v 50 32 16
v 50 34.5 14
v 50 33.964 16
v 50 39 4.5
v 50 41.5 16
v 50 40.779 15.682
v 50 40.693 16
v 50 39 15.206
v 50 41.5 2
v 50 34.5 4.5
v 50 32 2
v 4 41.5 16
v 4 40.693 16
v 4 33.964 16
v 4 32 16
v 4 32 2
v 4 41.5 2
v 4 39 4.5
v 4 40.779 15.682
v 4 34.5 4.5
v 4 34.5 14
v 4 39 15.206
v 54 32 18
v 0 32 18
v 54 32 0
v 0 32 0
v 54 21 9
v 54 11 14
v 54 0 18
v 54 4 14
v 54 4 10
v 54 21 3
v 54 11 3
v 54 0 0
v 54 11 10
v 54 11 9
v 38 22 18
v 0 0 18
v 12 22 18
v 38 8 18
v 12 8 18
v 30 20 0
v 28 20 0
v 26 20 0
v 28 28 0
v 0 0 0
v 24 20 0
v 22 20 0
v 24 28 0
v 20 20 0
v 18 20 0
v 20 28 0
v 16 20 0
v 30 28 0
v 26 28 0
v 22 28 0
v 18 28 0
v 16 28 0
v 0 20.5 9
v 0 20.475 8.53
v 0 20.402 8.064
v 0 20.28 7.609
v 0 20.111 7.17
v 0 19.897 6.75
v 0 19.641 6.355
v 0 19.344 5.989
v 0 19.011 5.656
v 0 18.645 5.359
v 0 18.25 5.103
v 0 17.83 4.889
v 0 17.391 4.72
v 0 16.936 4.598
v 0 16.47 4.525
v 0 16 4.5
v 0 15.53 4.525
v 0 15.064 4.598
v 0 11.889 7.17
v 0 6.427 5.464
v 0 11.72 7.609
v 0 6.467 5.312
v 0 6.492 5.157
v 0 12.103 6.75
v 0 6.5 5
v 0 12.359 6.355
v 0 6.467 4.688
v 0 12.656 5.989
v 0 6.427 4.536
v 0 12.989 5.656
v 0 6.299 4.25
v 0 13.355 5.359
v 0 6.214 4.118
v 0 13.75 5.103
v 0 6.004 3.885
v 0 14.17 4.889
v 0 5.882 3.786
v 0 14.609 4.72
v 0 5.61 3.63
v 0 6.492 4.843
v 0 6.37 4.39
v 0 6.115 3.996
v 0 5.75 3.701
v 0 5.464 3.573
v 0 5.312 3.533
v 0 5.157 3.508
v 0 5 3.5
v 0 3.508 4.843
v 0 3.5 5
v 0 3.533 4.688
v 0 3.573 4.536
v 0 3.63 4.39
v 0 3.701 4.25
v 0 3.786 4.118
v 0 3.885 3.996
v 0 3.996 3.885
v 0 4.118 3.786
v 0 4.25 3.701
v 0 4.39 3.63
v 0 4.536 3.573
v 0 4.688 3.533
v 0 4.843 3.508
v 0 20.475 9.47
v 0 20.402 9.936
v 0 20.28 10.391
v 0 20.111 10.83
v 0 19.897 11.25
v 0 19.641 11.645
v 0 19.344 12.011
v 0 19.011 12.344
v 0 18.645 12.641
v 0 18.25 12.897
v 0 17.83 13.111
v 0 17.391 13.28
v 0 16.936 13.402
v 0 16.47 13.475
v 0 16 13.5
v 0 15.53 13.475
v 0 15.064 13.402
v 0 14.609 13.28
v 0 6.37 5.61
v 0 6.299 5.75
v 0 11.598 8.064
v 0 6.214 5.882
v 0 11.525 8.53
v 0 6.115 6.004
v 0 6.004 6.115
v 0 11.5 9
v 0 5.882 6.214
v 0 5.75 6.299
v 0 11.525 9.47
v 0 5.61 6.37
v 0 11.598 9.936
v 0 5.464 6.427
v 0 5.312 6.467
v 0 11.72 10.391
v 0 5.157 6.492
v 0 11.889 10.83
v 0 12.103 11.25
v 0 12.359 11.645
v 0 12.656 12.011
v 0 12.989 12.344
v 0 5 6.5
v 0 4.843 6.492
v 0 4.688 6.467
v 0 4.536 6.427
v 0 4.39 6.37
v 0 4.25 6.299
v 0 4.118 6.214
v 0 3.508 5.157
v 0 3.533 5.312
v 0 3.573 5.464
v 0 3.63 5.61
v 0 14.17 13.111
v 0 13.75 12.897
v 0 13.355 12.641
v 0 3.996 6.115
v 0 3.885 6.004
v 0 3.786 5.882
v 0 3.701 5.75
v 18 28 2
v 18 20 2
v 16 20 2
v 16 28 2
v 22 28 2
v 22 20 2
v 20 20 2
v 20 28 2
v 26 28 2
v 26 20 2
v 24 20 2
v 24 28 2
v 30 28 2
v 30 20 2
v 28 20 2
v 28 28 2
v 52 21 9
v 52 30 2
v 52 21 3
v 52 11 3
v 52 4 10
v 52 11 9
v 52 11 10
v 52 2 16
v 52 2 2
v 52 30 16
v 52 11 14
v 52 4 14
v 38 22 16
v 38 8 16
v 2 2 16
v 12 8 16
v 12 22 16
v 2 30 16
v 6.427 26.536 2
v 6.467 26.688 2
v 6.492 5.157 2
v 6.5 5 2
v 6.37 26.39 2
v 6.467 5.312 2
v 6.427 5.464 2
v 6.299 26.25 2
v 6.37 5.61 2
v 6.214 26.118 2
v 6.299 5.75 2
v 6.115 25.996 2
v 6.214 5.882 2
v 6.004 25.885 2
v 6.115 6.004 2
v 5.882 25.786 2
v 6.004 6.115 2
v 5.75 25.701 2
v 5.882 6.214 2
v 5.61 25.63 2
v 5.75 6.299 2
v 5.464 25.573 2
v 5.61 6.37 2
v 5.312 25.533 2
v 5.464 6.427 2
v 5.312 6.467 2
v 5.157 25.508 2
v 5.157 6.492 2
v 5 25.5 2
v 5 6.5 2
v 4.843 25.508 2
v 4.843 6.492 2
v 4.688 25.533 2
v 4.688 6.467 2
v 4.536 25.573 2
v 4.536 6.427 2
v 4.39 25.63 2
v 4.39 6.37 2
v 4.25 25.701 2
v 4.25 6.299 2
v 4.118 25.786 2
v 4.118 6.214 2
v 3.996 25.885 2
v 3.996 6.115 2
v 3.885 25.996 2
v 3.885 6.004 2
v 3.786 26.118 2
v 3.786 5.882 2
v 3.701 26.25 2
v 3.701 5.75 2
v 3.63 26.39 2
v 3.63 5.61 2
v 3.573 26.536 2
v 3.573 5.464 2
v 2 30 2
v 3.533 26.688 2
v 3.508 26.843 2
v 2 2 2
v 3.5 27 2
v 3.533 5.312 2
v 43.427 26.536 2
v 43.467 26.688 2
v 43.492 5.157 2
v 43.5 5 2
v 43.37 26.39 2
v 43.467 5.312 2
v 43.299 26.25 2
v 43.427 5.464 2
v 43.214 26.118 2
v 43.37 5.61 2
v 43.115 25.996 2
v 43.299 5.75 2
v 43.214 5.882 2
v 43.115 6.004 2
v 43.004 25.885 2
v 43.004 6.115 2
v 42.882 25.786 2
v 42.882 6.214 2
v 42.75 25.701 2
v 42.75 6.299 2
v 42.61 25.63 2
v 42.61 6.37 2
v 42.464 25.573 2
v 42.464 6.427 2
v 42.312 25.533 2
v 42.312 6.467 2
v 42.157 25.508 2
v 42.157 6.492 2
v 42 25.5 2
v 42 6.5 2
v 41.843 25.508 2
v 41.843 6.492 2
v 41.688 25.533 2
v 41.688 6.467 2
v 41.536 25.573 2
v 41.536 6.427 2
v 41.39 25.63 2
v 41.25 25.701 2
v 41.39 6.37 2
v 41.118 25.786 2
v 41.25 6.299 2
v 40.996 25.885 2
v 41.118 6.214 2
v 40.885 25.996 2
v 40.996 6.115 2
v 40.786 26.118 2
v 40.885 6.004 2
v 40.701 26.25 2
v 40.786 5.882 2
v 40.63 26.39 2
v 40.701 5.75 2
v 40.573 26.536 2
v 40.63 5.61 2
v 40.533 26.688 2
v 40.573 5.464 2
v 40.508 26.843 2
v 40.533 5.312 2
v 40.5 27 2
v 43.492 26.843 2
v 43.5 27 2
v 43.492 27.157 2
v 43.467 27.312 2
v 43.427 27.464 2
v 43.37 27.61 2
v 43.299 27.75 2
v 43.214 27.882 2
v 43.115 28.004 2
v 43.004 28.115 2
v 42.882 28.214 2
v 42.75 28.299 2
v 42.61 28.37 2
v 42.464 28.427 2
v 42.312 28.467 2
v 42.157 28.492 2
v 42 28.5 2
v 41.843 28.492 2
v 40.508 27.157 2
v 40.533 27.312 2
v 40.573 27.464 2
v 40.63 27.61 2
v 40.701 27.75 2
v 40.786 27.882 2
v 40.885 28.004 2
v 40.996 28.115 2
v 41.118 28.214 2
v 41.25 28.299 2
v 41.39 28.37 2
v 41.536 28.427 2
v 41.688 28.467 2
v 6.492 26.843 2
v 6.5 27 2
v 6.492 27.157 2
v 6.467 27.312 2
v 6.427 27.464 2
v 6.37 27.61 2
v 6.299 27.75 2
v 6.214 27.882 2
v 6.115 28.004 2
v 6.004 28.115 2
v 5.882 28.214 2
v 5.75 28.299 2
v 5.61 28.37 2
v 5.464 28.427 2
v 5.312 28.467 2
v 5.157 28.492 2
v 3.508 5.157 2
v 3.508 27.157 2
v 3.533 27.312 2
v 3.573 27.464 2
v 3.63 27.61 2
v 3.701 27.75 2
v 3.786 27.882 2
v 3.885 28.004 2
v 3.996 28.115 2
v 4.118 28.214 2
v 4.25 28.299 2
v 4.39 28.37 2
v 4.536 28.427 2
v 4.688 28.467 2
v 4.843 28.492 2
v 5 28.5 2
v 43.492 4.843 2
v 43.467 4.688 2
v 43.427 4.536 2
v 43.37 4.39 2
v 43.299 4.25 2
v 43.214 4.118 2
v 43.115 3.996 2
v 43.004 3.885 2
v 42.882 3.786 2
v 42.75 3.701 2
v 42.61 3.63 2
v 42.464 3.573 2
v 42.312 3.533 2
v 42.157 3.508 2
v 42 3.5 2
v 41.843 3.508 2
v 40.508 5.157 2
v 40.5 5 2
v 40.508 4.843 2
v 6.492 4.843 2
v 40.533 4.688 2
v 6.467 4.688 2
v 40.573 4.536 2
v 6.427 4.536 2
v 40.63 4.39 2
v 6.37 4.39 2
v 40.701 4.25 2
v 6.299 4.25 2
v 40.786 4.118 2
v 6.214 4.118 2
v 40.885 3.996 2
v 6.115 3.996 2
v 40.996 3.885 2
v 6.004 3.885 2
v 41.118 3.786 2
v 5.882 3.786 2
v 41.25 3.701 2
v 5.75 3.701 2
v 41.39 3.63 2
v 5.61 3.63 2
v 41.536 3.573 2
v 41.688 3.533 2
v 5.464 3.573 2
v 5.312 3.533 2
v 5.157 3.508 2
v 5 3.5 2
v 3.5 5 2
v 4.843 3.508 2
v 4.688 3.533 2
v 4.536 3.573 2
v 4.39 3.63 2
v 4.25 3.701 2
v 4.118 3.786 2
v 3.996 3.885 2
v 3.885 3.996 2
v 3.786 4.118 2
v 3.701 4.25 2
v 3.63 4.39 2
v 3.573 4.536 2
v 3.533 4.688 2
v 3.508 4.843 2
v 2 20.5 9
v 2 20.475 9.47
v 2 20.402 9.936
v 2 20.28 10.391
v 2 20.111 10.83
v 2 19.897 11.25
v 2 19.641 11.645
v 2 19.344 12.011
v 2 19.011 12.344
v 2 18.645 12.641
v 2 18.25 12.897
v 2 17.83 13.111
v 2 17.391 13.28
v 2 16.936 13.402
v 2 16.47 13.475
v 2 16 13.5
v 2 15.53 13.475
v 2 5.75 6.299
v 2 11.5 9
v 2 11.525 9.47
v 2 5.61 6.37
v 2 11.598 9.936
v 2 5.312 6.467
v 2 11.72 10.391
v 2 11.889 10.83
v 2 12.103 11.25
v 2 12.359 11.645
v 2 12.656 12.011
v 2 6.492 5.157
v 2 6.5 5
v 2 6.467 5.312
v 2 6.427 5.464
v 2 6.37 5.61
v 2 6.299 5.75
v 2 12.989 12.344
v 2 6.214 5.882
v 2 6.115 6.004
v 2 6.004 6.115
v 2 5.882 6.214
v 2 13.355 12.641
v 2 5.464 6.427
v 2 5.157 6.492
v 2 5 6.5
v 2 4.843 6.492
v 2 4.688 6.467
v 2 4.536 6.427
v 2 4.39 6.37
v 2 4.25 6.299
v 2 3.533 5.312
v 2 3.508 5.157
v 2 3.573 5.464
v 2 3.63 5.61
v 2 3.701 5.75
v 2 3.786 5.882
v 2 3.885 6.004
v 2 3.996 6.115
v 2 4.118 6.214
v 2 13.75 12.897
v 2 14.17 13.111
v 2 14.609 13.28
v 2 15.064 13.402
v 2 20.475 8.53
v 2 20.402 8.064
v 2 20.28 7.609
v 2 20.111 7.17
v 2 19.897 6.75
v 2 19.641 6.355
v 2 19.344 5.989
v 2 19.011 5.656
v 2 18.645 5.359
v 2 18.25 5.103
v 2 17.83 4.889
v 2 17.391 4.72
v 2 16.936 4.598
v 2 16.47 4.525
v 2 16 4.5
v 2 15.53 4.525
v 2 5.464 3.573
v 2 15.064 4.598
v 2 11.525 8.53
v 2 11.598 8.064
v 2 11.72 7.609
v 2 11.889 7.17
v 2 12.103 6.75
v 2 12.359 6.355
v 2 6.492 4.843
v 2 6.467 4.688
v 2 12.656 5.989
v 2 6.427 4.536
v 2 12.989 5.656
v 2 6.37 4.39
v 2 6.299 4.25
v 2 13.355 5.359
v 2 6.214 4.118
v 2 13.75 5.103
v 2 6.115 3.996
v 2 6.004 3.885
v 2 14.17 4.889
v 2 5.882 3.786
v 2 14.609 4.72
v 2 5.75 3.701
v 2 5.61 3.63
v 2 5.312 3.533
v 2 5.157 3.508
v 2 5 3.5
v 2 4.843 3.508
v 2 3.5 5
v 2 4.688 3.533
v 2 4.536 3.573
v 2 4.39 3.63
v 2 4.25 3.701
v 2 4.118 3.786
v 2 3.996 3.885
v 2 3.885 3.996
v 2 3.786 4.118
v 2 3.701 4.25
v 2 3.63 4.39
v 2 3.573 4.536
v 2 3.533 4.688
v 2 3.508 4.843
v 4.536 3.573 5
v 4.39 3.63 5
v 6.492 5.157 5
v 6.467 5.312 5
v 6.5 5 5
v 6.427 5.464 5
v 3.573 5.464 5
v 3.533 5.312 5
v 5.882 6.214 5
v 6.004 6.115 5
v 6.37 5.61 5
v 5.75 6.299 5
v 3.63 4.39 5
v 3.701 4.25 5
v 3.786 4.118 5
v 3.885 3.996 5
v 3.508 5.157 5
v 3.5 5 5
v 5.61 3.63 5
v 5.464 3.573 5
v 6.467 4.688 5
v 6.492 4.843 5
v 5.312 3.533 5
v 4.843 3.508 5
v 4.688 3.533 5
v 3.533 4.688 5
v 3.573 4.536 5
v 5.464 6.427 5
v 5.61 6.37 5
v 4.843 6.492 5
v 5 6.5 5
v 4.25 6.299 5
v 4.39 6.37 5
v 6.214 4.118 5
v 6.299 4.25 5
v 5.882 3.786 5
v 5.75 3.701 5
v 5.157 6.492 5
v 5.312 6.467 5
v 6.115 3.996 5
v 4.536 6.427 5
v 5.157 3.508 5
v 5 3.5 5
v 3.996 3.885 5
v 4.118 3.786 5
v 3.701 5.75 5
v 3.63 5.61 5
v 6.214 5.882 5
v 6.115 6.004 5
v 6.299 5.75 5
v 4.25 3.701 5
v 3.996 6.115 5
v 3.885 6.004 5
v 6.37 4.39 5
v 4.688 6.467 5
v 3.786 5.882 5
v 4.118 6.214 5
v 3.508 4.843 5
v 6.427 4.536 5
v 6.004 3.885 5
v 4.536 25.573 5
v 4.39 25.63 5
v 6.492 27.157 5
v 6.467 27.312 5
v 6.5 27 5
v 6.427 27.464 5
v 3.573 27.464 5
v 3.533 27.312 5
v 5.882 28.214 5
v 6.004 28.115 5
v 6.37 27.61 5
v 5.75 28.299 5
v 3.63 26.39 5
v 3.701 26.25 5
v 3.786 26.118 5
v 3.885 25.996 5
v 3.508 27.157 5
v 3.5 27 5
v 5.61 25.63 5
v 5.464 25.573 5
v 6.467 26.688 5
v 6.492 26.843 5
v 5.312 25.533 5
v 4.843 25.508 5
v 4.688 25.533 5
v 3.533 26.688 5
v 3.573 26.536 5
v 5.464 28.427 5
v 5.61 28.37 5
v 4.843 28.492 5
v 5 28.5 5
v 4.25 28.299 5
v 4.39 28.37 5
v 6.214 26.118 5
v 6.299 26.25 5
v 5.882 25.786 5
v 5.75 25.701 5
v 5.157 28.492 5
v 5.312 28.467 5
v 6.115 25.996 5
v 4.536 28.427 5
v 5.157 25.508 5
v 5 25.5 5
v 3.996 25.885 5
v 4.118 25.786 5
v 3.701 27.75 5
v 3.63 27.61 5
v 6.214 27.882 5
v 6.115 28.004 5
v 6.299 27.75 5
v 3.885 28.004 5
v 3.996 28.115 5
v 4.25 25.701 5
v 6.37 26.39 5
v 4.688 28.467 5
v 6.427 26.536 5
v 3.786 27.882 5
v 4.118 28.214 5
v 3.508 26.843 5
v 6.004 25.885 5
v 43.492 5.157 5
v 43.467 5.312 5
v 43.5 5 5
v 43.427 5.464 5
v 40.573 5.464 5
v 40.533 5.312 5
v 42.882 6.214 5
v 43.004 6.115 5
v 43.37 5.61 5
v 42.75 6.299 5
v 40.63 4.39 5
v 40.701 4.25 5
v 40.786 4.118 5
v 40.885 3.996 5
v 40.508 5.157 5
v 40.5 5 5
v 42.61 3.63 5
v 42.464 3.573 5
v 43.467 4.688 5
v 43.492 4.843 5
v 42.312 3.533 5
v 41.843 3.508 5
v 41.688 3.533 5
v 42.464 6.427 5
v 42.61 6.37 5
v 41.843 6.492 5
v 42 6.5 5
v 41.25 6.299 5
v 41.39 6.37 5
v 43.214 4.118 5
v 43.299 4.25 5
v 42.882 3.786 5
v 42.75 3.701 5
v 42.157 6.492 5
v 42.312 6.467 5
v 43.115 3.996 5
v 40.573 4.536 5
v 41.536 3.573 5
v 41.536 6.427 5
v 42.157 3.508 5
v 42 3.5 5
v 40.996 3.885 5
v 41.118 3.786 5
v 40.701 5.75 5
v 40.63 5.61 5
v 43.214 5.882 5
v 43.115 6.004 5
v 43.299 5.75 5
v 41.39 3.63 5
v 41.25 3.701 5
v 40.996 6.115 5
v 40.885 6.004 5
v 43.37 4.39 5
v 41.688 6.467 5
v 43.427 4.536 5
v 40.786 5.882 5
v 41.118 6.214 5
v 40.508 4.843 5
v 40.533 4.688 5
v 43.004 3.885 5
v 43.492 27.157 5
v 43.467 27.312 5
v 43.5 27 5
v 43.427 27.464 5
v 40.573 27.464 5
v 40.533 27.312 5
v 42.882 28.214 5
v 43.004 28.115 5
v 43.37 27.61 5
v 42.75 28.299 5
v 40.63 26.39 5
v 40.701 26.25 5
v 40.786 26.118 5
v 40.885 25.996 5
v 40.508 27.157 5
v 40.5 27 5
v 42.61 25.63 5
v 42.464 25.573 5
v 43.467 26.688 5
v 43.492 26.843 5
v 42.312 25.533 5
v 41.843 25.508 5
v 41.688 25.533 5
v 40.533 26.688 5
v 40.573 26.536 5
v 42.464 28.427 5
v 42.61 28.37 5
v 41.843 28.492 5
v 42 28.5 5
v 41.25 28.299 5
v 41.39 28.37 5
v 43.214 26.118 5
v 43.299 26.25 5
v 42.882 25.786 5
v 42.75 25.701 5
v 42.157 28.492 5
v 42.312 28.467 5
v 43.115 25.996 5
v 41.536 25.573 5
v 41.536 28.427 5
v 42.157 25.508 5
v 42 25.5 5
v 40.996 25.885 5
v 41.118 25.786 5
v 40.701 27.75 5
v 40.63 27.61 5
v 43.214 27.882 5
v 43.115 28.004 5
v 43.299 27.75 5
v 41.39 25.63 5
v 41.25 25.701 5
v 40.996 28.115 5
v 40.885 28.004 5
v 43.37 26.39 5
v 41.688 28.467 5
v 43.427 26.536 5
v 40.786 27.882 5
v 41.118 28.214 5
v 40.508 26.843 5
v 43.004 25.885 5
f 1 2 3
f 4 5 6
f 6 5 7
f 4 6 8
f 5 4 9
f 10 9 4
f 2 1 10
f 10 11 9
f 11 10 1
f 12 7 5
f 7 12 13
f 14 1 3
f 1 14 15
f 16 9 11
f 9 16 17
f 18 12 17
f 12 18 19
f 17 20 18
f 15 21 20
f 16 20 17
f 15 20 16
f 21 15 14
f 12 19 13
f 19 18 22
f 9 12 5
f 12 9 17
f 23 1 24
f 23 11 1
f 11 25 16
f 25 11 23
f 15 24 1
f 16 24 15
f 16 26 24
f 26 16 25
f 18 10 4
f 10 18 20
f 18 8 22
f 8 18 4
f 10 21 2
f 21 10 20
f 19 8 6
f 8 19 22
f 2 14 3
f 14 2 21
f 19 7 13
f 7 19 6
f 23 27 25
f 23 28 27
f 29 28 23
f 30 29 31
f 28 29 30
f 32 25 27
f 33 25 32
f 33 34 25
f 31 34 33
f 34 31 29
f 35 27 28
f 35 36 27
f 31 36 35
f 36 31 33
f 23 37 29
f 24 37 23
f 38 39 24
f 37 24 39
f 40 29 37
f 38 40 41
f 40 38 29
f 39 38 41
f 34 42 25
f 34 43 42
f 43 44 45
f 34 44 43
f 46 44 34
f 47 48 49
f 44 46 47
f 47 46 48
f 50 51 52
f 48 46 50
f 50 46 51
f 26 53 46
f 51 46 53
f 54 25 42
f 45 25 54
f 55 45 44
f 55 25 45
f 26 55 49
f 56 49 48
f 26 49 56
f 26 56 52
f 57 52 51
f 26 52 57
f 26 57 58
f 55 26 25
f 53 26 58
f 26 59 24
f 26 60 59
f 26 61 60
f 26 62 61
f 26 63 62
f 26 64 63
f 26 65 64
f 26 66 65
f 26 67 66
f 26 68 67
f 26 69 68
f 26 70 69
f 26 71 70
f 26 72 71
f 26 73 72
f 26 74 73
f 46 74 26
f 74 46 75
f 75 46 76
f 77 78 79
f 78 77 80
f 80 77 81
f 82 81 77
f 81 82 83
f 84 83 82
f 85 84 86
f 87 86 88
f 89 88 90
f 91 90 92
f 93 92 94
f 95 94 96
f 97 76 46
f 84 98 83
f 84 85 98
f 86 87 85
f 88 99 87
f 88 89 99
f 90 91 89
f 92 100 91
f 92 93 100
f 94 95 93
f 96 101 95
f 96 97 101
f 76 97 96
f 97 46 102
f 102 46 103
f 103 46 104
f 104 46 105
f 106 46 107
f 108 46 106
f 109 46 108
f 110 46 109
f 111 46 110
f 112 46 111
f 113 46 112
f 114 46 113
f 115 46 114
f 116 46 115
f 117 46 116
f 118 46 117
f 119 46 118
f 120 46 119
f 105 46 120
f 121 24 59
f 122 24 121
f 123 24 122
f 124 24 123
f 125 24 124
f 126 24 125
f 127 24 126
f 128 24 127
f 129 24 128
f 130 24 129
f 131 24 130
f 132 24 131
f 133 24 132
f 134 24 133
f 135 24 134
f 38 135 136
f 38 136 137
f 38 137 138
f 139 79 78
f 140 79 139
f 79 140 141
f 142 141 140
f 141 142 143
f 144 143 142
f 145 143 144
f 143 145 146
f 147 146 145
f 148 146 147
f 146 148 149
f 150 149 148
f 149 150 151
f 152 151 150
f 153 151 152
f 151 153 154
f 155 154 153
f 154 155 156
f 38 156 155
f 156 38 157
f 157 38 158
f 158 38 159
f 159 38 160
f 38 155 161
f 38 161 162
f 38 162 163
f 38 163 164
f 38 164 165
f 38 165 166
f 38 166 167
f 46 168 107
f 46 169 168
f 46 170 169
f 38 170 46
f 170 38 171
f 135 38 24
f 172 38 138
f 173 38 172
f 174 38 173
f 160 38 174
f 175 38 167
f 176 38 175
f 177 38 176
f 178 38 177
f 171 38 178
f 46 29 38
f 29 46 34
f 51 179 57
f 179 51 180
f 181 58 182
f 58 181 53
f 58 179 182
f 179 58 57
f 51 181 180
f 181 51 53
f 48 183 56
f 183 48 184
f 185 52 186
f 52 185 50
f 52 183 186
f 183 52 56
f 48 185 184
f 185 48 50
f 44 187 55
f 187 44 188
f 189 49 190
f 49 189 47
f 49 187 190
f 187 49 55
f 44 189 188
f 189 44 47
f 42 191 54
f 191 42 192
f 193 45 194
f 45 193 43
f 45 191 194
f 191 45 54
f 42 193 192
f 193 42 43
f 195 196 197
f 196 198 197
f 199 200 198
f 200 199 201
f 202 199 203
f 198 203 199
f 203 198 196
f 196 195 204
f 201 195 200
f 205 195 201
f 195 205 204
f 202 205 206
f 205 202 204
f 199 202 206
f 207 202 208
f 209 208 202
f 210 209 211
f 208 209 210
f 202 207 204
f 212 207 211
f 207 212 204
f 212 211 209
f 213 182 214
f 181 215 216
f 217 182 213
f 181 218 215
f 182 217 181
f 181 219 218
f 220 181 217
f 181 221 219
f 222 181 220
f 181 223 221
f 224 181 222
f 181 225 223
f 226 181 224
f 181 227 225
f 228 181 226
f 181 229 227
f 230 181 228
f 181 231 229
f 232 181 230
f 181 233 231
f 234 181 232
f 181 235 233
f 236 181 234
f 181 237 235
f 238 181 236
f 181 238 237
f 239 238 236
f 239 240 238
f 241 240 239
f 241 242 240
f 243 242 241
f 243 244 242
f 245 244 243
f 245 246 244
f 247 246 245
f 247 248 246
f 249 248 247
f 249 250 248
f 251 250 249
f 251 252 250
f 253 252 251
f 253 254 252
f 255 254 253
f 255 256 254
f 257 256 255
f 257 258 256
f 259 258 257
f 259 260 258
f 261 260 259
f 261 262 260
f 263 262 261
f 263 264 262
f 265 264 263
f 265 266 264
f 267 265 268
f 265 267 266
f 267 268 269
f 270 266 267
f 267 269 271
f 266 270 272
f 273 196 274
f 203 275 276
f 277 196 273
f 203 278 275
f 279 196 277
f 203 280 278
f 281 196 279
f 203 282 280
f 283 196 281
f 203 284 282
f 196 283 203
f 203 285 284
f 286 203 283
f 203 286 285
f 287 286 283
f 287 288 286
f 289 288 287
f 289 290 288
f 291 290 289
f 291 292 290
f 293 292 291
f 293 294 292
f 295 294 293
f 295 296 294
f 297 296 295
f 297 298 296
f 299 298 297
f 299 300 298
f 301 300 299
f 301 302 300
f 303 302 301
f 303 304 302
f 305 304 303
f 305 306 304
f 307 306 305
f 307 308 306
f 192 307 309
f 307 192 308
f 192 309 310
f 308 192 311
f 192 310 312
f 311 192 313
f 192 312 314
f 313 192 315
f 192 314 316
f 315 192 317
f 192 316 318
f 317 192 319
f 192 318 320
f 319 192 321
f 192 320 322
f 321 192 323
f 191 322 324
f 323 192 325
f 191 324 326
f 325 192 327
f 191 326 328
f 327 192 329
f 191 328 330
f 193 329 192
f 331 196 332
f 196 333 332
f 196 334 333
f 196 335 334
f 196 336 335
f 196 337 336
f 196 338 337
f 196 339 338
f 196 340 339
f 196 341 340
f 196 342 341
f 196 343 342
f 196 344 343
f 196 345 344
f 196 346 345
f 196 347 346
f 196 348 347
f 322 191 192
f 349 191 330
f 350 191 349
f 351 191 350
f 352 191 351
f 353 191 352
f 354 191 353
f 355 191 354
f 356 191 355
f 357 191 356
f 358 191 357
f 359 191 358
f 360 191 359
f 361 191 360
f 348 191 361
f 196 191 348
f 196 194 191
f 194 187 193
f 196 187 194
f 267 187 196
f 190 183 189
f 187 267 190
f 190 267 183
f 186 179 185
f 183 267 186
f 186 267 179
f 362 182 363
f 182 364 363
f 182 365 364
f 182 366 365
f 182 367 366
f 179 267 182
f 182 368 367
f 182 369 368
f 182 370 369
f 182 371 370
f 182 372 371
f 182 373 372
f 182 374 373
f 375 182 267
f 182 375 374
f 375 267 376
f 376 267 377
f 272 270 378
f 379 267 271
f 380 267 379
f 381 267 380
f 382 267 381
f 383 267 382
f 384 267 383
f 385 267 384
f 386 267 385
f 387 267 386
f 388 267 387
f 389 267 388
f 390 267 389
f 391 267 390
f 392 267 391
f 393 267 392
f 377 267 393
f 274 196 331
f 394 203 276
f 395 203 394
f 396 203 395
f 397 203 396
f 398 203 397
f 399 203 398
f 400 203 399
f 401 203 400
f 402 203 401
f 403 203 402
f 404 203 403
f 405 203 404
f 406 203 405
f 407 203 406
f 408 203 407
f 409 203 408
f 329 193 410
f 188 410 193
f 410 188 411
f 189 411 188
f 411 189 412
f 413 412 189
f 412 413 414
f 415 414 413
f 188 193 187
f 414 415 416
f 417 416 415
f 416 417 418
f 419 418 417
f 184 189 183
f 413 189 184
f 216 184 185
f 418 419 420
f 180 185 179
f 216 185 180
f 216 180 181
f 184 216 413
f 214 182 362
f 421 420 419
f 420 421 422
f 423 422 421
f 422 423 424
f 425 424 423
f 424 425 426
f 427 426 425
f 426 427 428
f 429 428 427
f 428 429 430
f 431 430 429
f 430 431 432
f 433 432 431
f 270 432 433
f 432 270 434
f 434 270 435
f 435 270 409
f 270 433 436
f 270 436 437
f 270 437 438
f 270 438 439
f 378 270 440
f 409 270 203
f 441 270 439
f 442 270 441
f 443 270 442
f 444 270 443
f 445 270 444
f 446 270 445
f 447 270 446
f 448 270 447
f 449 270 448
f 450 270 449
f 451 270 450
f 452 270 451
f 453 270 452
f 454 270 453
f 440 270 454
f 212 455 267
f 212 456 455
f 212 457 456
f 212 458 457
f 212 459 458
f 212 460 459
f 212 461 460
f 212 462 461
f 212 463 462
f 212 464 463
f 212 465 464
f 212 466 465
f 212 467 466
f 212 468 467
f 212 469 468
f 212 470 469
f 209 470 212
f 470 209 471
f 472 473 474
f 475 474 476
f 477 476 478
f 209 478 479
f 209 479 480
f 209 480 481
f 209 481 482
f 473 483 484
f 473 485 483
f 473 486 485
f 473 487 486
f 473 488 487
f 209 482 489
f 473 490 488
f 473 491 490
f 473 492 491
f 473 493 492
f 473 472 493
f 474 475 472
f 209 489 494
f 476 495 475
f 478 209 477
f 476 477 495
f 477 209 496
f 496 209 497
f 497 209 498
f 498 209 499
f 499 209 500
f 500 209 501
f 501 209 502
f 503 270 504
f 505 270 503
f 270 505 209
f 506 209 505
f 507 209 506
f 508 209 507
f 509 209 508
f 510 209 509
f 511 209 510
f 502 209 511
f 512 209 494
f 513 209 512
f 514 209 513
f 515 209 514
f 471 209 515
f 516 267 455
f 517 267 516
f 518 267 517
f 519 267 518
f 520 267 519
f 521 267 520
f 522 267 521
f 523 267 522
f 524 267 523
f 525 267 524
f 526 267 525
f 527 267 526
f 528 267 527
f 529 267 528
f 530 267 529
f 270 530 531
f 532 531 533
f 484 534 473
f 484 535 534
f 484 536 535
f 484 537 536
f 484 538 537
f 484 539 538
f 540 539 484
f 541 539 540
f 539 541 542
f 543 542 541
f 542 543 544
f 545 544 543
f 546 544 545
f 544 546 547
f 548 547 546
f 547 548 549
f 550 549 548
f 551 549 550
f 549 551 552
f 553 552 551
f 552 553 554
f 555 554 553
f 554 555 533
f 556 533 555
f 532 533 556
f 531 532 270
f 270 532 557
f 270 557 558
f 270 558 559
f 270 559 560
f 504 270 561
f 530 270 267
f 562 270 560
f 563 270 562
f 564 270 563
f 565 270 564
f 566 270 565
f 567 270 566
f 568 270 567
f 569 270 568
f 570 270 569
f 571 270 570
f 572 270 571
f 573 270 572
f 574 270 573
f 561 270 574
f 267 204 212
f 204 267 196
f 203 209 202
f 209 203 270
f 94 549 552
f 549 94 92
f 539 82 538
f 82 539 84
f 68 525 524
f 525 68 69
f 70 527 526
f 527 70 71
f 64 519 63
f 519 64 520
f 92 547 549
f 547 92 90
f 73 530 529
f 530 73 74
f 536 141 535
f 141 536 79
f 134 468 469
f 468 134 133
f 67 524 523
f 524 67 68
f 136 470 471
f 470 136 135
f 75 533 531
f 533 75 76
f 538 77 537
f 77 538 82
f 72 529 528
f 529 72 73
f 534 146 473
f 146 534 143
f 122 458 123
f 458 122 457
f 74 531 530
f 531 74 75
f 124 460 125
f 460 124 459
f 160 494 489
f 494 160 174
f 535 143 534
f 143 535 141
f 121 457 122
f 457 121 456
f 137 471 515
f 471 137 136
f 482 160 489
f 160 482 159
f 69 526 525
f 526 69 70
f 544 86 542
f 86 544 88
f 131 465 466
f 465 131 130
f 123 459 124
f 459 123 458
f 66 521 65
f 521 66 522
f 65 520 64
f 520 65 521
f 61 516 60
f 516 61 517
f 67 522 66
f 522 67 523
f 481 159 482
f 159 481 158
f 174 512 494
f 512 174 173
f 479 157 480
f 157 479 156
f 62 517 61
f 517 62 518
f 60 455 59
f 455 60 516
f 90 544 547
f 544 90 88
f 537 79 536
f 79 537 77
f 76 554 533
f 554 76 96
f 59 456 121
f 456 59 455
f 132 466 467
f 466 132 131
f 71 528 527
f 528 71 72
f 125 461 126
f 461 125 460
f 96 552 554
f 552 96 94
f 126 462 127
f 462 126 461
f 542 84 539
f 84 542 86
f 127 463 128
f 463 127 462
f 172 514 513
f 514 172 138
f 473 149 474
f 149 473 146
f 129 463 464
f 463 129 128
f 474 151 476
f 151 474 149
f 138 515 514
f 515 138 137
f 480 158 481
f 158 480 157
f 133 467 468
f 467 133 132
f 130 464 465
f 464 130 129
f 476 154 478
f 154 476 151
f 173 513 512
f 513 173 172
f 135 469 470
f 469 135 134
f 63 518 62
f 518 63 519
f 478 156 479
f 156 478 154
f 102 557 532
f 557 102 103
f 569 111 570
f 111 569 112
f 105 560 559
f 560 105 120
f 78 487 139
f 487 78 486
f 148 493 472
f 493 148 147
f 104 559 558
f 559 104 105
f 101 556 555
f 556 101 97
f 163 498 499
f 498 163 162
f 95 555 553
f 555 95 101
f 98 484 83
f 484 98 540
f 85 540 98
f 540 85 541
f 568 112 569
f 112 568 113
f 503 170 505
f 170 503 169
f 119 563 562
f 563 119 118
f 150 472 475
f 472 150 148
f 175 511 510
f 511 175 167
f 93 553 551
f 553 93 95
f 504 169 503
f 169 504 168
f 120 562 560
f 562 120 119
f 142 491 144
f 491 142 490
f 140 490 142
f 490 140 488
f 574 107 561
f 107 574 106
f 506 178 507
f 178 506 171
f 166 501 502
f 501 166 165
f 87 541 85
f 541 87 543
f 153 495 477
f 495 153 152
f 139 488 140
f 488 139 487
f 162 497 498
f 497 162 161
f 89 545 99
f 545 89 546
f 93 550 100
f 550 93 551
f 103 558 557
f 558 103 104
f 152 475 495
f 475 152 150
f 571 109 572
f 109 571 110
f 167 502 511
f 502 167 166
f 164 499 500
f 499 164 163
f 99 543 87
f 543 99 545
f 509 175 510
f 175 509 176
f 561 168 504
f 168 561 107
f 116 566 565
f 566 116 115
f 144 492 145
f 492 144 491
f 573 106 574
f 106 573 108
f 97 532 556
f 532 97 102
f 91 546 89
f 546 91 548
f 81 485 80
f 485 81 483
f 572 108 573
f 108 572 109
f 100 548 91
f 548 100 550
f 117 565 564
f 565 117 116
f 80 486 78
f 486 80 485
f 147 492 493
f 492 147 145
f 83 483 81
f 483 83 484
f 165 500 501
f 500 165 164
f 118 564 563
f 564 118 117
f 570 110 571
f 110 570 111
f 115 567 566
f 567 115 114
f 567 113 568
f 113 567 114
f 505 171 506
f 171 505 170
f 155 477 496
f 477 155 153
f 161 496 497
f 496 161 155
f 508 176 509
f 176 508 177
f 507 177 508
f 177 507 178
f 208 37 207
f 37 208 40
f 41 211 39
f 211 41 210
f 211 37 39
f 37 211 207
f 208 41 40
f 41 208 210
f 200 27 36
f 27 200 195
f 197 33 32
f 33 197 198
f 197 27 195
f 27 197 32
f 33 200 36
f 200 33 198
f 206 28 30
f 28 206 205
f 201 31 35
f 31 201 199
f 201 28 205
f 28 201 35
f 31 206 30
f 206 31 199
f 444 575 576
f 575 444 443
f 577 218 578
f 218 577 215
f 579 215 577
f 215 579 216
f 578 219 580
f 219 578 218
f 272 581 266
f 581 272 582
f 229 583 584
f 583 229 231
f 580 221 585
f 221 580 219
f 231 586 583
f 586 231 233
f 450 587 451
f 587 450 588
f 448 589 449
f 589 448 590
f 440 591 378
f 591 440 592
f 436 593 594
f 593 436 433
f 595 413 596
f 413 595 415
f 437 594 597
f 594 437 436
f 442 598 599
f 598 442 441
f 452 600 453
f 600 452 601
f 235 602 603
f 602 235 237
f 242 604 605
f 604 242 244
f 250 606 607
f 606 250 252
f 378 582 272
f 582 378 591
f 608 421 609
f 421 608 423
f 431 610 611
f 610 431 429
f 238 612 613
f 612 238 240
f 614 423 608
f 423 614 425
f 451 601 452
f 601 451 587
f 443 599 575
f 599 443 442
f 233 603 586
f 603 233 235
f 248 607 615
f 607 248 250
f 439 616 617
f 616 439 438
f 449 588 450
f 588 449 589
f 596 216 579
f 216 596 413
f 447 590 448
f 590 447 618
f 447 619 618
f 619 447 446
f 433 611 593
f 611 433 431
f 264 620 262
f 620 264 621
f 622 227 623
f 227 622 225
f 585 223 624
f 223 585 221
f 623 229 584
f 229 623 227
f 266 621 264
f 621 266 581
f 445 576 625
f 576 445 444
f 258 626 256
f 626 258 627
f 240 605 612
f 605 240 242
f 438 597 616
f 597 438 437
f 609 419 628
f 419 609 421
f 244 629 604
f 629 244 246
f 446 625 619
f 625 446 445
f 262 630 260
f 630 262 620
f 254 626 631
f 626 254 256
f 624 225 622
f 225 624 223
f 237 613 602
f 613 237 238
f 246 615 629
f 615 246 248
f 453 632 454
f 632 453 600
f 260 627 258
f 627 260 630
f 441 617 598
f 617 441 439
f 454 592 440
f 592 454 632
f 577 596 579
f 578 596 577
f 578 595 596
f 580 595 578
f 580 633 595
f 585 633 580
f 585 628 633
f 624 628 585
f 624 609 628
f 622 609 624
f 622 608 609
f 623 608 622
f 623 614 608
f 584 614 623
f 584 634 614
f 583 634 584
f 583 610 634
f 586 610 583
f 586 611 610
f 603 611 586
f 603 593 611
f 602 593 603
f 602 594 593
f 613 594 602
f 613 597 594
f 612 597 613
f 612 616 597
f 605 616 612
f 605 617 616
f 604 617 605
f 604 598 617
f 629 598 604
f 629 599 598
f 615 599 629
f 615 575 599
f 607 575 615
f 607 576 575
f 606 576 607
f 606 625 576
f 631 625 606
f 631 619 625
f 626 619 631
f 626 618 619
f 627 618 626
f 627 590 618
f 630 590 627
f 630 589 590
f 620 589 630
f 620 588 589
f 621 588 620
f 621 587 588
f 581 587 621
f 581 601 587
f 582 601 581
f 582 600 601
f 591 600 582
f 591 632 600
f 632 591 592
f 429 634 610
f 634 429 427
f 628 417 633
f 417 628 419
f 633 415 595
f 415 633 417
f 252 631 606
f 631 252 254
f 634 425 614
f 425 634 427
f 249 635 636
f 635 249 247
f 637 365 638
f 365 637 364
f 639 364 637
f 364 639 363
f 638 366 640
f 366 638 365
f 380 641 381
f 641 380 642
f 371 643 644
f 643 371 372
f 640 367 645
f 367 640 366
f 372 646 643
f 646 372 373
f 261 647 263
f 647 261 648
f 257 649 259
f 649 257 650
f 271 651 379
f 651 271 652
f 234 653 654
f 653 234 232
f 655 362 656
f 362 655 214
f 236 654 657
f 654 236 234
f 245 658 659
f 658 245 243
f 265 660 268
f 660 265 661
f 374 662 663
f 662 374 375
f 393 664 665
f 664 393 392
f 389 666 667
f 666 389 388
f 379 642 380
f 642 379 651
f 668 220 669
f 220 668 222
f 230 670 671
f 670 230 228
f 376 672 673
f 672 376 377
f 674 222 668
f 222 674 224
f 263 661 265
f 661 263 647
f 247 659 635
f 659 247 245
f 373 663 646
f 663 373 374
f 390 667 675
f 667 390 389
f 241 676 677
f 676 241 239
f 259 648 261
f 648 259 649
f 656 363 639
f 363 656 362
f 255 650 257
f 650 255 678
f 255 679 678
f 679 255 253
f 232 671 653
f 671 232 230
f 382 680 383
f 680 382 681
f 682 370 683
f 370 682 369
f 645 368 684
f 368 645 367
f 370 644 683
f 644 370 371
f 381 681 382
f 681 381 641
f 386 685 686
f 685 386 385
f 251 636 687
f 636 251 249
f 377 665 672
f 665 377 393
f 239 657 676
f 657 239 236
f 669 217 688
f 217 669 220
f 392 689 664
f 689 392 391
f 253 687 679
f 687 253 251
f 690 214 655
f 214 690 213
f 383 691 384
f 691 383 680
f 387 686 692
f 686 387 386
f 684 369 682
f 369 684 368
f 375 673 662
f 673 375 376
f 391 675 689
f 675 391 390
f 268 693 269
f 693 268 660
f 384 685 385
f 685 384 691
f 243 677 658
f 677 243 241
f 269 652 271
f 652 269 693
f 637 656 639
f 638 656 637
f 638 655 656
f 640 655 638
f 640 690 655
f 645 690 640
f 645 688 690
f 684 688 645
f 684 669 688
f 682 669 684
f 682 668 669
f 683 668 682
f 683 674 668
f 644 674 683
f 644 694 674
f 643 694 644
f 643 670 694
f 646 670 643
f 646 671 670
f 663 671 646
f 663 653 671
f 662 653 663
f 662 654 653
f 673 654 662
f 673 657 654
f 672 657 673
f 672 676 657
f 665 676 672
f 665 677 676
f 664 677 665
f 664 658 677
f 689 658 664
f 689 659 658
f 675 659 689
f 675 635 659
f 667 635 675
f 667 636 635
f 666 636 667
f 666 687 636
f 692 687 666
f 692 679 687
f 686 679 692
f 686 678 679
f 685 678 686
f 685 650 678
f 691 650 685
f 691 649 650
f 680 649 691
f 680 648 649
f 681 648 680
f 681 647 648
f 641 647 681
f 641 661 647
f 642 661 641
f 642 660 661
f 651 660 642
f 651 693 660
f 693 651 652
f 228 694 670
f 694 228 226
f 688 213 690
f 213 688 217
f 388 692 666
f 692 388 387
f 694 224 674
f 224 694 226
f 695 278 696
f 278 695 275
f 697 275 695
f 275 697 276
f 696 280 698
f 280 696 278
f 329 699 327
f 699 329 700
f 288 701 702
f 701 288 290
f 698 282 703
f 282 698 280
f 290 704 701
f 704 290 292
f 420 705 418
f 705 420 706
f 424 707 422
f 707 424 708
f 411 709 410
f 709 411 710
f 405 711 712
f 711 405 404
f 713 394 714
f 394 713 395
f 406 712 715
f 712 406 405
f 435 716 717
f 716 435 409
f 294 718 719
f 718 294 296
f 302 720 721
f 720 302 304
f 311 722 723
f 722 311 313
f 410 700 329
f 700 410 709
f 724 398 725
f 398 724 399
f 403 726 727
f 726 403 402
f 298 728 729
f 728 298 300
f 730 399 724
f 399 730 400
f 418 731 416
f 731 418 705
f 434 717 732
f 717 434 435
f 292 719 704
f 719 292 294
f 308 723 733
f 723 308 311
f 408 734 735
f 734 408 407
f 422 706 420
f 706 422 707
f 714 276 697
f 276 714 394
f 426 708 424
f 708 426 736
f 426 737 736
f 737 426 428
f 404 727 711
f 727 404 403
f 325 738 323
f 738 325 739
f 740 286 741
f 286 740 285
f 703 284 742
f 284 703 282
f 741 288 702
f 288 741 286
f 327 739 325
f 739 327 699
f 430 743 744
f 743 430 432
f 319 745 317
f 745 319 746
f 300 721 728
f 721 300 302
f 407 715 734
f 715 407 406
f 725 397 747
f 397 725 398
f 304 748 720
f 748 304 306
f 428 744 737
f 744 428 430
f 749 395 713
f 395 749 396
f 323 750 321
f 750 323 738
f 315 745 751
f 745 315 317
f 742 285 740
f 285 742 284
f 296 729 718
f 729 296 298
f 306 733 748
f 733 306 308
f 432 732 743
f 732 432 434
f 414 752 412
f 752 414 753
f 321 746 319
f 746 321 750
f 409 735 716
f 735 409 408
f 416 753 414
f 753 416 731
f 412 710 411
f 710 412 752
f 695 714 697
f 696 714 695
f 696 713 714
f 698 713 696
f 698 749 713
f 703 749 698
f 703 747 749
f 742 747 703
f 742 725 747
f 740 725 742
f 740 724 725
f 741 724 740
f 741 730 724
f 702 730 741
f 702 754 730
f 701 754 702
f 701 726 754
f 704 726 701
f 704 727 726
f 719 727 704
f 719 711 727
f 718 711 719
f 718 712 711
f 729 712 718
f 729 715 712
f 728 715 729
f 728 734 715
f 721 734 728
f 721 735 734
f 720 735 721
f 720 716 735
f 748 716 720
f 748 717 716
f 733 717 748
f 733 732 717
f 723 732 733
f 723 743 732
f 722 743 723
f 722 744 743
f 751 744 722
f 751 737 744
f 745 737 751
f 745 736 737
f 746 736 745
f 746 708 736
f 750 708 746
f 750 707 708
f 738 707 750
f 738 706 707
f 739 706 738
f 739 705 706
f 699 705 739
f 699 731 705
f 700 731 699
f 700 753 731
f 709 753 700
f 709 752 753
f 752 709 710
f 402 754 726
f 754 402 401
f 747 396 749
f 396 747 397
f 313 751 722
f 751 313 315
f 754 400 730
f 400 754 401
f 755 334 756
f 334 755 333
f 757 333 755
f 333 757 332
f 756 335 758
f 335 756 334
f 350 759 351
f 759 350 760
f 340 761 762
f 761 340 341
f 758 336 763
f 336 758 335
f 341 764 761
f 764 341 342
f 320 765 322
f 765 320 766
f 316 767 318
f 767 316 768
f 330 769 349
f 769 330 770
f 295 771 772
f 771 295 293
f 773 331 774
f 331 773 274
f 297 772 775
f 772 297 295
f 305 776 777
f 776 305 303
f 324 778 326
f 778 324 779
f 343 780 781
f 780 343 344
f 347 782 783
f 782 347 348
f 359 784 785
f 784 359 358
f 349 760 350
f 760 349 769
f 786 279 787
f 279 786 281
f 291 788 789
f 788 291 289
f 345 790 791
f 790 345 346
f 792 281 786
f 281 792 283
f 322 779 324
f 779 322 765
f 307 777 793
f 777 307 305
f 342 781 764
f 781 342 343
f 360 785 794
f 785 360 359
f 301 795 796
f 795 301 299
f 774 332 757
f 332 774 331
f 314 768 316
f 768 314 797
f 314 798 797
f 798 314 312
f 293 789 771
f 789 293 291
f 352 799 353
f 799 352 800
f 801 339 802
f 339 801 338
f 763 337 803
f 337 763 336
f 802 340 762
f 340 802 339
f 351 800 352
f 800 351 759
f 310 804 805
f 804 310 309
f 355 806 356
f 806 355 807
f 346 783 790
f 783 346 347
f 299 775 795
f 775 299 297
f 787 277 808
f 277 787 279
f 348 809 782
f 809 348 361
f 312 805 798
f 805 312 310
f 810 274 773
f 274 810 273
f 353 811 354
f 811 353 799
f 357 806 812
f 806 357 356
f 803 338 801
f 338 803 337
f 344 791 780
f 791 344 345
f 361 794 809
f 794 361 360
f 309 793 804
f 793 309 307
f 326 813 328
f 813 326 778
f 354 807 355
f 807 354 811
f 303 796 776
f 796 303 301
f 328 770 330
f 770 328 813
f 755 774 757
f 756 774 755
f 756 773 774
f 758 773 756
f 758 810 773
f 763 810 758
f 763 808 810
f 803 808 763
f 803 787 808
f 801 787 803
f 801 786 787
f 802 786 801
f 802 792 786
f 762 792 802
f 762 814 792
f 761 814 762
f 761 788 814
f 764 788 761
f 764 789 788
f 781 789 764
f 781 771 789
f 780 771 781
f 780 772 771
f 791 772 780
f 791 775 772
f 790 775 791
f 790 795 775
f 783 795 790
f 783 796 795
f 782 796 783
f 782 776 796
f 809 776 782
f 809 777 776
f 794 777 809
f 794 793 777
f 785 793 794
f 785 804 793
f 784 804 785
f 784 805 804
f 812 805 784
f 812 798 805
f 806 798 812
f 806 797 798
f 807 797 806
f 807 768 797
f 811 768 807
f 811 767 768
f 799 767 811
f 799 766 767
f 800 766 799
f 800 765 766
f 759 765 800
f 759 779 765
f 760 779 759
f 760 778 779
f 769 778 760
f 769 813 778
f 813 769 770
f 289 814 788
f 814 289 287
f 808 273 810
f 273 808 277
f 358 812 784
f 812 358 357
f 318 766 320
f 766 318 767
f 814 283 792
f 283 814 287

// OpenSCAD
// ===================================================================
// AI SMART GLASSES - ALL-IN-ONE TEMPLE CLIP ENCLOSURE (3D PRINTABLE)
// Project: AI-Powered Smart Glasses using ESP32-CAM
// Units: Millimeters (mm)
// ===================================================================

$fn = 60; // Smooth curves

// Enclosure Dimensions
box_l = 54;  // Length along temple arm (X axis)
box_w = 32;  // Width/depth (Y axis)
box_h = 18;  // Height (Z axis)
wall  = 2;   // Wall thickness

// Component Dimensions & Offsets
cam_aperture_d = 9;   // Camera lens diameter
mic_aperture_d = 3;   // Microphone hole diameter
oled_win_l     = 26;  // OLED screen length
oled_win_w     = 14;  // OLED screen width
usb_slot_w     = 10;  // USB-C/Micro-USB cutout width
usb_slot_h     = 6;   // USB-C cutout height

// Clip Dimensions (Fits glasses stem 4mm - 8mm height, 2.5mm - 4mm thickness)
clip_gap_w     = 4.5; // Gap for glasses arm
clip_wall      = 2.5; // Wall thickness of clip C-channel

module main_enclosure() {
    difference() {
        // Outer Shell
        union() {
            // Main housing box
            cube([box_l, box_w, box_h]);
            
            // Integrated Glasses C-Clip on the Inner Back Face (Y = box_w)
            translate([4, box_w, 2])
                difference() {
                    cube([box_l - 8, clip_gap_w + clip_wall * 2, box_h - 4]);
                    // Inner channel cutout for glasses arm
                    translate([-1, clip_wall, clip_wall])
                        cube([box_l, clip_gap_w, box_h]);
                    // Angled entry chamfer for easy snap-on
                    translate([-1, clip_wall, box_h - 6])
                        rotate([15, 0, 0])
                            cube([box_l, clip_gap_w + 2, 10]);
                }
        }
        
        // Inner Cavity (Hollow Inside)
        translate([wall, wall, wall])
            cube([box_l - wall*2, box_w - wall*2, box_h - wall*2]);
            
        // -------------------------------------------------------------
        // CUTOUTS & APERTURES
        // -------------------------------------------------------------
        
        // 1. Camera Aperture (Front Face, X = 0)
        translate([-1, 16, box_h / 2])
            rotate([0, 90, 0])
                cylinder(d = cam_aperture_d, h = wall + 2);
                
        // 2. Microphone Port (Front Face, X = 0)
        translate([-1, 5, 5])
            rotate([0, 90, 0])
                cylinder(d = mic_aperture_d, h = wall + 2);

        // 3. OLED Screen Viewport (Top Face, Z = box_h)
        translate([12, 8, box_h - wall - 1])
            cube([oled_win_l, oled_win_w, wall + 3]);
            
        // 4. USB-C Charging Port Slot (Rear Face, X = box_l)
        translate([box_l - wall - 1, (box_w - usb_slot_w)/2, 3])
            cube([wall + 3, usb_slot_w, usb_slot_h]);
            
        // 5. Speaker Sound Grille (Bottom Face, Z = 0)
        for (i = [0:3]) {
            translate([16 + (i * 4), 20, -1])
                cube([2, 8, wall + 2]);
        }
        
        // 6. Power Switch Cutout (Rear Side, X = box_l)
        translate([box_l - wall - 1, 4, box_h - 8])
            cube([wall + 3, 7, 4]);
    }
    
    // Internal PCB Standoff Mounting Pegs
    translate([wall + 3, wall + 3, wall])
        cylinder(d=3, h=3);
    translate([wall + 3, box_w - wall - 3, wall])
        cylinder(d=3, h=3);
    translate([box_l - wall - 10, wall + 3, wall])
        cylinder(d=3, h=3);
    translate([box_l - wall - 10, box_w - wall - 3, wall])
        cylinder(d=3, h=3);
}

// Render the 3D Enclosure
main_enclosure();
